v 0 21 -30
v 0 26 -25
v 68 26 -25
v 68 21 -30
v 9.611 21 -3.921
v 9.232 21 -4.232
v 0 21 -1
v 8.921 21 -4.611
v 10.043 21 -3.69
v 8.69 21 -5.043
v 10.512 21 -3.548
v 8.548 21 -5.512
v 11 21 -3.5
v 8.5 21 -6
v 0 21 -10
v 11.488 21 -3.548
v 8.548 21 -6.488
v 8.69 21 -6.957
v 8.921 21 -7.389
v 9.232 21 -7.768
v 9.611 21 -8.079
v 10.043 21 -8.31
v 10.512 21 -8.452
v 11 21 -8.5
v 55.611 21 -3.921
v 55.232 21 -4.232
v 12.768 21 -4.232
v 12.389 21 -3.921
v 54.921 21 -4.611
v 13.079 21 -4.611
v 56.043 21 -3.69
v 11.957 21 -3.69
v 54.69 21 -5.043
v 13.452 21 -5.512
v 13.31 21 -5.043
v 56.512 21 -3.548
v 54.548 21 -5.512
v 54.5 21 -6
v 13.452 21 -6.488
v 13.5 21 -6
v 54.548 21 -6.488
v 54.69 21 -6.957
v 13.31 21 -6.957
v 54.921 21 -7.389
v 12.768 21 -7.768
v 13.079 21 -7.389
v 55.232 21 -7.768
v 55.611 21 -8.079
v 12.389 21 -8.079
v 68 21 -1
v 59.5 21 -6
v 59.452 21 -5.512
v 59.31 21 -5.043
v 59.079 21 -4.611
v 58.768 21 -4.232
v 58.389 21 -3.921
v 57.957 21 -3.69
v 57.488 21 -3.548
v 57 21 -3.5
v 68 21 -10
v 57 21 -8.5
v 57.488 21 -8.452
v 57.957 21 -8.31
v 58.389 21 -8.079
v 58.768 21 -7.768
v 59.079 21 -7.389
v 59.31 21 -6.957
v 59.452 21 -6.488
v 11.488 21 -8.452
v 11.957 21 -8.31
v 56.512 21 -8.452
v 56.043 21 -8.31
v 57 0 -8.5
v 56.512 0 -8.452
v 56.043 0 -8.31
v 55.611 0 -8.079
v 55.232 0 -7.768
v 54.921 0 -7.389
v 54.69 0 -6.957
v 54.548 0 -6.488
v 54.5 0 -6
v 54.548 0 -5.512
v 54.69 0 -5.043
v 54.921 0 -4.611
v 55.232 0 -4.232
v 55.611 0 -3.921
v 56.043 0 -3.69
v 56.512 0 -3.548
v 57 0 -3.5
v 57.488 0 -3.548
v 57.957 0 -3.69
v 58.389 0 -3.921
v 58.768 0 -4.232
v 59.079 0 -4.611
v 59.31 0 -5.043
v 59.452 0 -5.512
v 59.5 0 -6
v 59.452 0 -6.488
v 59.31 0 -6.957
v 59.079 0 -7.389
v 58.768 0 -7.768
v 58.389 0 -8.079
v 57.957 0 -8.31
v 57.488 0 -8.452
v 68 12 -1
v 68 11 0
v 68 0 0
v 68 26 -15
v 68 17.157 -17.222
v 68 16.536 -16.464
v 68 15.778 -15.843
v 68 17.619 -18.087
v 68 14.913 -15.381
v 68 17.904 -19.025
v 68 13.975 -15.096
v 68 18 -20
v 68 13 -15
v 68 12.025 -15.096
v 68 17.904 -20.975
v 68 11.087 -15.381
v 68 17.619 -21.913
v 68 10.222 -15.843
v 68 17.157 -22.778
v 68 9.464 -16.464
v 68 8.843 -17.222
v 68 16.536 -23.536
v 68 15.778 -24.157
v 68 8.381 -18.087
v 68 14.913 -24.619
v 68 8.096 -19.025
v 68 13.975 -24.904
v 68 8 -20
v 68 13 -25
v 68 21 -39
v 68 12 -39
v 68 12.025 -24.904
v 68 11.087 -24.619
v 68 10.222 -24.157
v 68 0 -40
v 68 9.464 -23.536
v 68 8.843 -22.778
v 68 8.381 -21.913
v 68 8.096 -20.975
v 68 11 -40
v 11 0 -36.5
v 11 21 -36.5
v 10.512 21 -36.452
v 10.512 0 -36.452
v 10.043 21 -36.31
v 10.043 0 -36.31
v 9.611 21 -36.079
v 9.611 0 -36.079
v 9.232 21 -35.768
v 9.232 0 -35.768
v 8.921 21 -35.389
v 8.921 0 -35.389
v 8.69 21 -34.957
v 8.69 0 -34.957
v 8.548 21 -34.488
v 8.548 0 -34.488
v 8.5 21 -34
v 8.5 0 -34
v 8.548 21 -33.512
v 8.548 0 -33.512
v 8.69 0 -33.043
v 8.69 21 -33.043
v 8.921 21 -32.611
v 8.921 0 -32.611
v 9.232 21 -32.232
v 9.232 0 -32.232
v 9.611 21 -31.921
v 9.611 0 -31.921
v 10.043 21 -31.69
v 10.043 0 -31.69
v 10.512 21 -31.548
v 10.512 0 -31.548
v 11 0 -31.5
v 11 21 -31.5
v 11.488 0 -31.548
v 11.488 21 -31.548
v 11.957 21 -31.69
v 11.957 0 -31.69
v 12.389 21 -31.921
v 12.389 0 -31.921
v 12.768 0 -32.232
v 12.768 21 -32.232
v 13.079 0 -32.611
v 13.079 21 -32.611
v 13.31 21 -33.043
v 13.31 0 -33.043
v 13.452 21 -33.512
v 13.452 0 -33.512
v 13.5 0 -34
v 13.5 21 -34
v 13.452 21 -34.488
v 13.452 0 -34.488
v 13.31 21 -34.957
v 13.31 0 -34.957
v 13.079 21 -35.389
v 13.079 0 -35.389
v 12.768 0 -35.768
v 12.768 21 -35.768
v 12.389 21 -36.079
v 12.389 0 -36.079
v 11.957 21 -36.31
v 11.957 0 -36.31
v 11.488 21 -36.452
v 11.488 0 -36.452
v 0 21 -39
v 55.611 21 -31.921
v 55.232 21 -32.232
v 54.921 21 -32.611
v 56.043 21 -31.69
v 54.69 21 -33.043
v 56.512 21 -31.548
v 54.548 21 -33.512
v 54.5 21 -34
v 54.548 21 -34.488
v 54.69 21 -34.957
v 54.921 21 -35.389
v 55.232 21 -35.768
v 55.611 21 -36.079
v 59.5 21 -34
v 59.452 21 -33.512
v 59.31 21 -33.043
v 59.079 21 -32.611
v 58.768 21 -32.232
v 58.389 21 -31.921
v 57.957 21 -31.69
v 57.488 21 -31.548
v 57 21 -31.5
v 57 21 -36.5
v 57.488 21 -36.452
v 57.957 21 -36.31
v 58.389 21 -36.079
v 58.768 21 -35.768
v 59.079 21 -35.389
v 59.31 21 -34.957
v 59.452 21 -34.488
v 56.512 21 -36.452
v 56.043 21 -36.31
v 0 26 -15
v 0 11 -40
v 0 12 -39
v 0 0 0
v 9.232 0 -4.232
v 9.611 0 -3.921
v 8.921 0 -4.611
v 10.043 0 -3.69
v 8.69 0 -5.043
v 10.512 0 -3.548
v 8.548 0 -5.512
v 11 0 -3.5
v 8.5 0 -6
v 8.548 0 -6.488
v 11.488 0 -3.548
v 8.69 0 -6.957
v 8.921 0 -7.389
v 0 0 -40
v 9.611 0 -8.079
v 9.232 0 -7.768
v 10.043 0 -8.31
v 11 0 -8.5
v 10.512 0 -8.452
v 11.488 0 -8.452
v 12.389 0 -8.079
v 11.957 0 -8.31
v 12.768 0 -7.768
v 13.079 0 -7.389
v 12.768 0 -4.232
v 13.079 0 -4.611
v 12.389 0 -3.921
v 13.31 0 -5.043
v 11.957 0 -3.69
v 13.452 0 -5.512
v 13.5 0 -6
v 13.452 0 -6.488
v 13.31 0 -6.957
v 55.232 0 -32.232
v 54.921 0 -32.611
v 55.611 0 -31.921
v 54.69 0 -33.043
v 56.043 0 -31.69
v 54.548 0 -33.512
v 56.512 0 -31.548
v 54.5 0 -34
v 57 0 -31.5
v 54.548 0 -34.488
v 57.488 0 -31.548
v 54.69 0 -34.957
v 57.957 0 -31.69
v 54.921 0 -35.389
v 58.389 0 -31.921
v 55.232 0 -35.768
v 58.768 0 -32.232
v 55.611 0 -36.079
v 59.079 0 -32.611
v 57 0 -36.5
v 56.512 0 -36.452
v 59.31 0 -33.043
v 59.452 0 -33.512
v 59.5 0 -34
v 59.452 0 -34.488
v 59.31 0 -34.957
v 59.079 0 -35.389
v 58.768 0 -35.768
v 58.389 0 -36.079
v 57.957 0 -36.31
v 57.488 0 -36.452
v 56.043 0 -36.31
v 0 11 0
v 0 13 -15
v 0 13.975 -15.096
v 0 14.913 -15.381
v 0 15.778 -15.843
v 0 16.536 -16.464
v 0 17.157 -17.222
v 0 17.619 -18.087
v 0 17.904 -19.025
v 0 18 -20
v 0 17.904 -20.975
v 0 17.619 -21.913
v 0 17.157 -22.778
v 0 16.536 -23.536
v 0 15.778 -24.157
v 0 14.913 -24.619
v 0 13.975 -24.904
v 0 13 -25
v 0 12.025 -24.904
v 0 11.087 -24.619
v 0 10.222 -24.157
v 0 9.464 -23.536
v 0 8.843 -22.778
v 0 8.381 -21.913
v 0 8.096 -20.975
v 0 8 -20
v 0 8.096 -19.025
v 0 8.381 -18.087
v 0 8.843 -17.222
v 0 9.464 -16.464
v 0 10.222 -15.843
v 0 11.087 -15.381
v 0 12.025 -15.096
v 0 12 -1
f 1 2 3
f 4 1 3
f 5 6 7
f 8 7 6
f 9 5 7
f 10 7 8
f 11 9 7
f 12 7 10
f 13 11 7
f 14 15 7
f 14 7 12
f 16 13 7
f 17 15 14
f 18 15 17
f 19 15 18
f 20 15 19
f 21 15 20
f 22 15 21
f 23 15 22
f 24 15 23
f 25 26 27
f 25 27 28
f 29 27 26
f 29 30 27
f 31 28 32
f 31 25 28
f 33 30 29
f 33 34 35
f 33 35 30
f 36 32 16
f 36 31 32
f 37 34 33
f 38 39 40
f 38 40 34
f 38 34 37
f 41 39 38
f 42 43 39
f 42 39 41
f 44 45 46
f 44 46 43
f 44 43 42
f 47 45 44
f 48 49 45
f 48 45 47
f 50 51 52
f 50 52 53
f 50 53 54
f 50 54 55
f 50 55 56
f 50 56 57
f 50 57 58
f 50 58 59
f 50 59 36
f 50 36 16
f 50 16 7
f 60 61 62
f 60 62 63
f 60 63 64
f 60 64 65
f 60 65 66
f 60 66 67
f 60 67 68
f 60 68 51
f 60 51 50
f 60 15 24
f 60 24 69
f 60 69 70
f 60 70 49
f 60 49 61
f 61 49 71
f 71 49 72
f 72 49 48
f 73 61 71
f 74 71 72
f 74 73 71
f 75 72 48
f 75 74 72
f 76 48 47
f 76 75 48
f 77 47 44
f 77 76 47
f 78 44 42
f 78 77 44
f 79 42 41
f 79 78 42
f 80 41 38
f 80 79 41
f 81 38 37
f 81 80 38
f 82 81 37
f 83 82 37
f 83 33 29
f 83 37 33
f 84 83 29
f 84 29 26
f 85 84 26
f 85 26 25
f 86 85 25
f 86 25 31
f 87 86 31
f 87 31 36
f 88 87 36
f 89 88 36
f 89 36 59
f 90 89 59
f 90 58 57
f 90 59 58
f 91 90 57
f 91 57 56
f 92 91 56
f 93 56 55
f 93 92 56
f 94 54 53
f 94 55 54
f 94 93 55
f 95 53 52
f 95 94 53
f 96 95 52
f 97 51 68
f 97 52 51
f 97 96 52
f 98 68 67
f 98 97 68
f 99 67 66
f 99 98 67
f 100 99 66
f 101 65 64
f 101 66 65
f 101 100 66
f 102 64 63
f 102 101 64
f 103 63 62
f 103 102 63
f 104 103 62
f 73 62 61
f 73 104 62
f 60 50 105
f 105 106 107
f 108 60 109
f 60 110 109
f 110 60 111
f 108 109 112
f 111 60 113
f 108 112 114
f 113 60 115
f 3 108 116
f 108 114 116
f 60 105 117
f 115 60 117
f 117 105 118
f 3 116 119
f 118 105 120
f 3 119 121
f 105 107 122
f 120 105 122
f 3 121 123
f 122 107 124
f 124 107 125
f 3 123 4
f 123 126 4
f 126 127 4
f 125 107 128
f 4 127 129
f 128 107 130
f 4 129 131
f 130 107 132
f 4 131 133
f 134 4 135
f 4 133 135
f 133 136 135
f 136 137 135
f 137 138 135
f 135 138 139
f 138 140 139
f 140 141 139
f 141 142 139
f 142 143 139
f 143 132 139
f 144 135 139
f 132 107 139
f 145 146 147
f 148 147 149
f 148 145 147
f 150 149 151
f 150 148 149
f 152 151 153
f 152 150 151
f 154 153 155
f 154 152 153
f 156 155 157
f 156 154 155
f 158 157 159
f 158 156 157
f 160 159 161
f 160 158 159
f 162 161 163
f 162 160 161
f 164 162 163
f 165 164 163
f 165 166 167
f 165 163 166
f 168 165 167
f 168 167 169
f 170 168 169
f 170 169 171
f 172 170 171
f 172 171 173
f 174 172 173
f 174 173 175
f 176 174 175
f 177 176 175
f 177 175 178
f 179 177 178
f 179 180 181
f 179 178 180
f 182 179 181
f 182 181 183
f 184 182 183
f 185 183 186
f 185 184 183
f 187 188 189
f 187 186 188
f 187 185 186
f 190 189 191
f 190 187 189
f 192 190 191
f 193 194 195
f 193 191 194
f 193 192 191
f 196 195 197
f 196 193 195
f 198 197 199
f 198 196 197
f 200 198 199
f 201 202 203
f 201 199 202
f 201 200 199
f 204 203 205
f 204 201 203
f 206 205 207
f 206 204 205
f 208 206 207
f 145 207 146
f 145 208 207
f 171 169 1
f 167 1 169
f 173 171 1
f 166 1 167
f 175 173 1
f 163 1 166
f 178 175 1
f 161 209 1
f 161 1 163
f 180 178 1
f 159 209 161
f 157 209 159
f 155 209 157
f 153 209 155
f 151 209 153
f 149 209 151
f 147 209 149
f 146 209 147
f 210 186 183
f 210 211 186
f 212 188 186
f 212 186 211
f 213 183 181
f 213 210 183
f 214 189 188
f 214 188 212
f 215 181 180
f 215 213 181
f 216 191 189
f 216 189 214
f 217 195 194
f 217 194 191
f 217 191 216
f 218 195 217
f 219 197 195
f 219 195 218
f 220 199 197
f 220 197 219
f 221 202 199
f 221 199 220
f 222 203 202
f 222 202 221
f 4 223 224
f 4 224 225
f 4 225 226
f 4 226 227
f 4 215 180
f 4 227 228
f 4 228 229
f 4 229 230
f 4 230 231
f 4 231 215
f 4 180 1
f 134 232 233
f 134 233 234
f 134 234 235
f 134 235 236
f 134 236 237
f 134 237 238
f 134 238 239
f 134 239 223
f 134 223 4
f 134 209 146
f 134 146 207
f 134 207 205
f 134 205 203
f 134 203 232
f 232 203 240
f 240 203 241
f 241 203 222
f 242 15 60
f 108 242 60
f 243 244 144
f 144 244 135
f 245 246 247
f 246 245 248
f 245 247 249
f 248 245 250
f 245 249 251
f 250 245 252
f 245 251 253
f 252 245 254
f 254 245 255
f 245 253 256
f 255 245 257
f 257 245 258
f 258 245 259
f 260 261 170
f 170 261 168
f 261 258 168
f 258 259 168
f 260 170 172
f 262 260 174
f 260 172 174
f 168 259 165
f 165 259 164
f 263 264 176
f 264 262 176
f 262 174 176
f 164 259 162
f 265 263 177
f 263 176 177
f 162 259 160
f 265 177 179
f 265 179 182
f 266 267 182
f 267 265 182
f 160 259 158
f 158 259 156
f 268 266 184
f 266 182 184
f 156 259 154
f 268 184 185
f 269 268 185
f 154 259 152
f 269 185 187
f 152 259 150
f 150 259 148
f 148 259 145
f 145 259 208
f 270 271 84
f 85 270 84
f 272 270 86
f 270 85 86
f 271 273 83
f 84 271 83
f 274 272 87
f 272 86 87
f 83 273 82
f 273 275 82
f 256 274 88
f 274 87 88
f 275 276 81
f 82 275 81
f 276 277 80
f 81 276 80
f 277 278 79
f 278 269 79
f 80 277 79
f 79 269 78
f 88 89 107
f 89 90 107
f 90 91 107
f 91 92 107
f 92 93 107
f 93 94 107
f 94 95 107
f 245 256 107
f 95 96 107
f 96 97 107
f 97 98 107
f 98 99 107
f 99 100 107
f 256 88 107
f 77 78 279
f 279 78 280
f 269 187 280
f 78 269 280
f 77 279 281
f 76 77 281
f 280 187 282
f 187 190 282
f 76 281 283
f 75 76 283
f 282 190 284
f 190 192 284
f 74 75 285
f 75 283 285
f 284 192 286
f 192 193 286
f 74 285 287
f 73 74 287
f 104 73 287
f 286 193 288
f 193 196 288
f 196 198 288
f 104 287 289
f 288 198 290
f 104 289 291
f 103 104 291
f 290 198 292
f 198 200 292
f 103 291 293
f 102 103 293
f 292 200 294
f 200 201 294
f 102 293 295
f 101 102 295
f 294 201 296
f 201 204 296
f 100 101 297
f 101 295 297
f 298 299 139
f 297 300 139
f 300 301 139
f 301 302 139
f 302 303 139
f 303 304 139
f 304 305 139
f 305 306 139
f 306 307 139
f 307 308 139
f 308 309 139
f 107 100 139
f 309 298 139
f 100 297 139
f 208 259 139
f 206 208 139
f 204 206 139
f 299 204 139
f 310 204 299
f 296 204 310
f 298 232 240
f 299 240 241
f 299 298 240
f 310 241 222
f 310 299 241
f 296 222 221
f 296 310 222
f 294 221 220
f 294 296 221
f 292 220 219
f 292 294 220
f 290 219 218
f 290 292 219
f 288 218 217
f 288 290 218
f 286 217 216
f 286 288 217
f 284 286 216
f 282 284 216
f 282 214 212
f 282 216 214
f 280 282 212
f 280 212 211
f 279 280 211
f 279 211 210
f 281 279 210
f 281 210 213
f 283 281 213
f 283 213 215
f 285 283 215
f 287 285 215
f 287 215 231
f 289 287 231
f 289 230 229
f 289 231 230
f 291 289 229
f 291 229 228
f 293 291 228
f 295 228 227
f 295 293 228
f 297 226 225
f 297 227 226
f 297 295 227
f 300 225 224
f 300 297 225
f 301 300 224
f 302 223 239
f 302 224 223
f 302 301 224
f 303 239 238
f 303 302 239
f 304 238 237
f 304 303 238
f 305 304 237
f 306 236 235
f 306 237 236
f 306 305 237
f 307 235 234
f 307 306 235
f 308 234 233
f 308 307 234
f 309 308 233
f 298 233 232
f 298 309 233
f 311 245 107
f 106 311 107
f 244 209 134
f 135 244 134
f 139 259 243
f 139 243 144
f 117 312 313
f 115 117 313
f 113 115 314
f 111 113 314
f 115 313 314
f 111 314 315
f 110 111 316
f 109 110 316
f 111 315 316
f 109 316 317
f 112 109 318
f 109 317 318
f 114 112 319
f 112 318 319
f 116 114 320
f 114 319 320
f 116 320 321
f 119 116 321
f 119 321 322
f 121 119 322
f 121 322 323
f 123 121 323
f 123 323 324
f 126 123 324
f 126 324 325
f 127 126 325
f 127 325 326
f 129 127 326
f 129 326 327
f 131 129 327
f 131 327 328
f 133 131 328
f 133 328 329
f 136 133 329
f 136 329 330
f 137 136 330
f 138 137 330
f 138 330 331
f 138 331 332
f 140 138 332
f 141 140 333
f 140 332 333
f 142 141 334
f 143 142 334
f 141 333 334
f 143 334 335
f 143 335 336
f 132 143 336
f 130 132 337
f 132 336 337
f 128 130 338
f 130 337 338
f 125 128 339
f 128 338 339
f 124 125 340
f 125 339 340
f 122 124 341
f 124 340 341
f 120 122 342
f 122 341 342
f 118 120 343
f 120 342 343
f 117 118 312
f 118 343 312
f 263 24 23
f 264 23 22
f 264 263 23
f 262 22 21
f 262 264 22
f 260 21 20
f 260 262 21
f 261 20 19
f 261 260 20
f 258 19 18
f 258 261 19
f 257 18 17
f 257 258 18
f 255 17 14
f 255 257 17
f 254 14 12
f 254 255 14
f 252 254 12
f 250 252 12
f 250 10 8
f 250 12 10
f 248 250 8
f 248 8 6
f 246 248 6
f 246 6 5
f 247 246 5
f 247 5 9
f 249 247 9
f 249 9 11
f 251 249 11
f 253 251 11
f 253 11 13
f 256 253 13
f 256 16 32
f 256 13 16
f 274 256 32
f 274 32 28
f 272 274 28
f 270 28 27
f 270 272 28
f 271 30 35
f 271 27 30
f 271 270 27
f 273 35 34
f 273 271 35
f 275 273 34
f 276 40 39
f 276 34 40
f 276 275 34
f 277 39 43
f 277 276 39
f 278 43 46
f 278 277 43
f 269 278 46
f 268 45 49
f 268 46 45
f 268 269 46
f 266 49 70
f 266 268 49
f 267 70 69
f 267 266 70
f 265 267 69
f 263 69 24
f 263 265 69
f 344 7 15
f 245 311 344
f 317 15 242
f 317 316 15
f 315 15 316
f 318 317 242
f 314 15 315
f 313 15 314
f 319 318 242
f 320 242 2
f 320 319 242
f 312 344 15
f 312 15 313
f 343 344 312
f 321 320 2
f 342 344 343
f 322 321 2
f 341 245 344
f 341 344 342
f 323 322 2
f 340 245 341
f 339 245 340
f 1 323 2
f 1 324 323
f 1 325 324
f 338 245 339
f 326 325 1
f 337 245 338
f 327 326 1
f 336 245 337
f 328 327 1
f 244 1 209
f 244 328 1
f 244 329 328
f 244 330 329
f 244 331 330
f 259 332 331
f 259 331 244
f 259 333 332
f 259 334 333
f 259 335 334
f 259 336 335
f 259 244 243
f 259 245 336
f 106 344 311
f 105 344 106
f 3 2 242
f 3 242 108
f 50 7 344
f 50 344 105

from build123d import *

# Parameters (mm, degrees)
SKETCH_1_W          = 68
SKETCH_1_H          = 40
SKETCH_1_R          = 2.5
EXTRUDE_1_DEPTH     = 26
SKETCH_2_R          = 5
CUT_EXTRUDE_1_DEPTH = 76
SKETCH_3_W          = 68
SKETCH_3_H          = 10
CUT_EXTRUDE_2_DEPTH = 5
CHAMFER_1_SIZE      = 5
CHAMFER_2_SIZE      = 5
SKETCH_4_W          = 68
SKETCH_4_H          = 1
CUT_EXTRUDE_3_DEPTH = 9
CHAMFER_3_SIZE      = 1
CHAMFER_4_SIZE      = 1


with BuildPart() as part:
    # Эскиз1 → Бобышка-Вытянуть1 (new body)
    with BuildSketch(Plane(origin=(0, 0, 0), x_dir=(1, 0, 0), z_dir=(0, 1, 0))):
        with Locations((34, 20)):
            Rectangle(SKETCH_1_W, SKETCH_1_H)
        with Locations(Location((11, 34, 0), (0, 0, 90))):
            Circle(SKETCH_1_R, mode=Mode.SUBTRACT)
        with Locations(Location((11, 6, 0), (0, 0, 90))):
            Circle(SKETCH_1_R, mode=Mode.SUBTRACT)
        with Locations(Location((57, 34, 0), (0, 0, 90))):
            Circle(SKETCH_1_R, mode=Mode.SUBTRACT)
        with Locations(Location((57, 6, 0), (0, 0, 90))):
            Circle(SKETCH_1_R, mode=Mode.SUBTRACT)
    extrude(amount=EXTRUDE_1_DEPTH)

    # Эскиз2 → Вырез-Вытянуть1 (cut)
    with BuildSketch(Plane.ZY):
        with Locations((-20, 13)):
            Circle(SKETCH_2_R)
    extrude(amount=-CUT_EXTRUDE_1_DEPTH, mode=Mode.SUBTRACT)

    # Эскиз3 → Вырез-Вытянуть2 (cut)
    with BuildSketch(Plane(origin=(0, 26, 0), x_dir=(1, 0, 0), z_dir=(0, 1, 0))):
        with Locations((34, 35)):
            Rectangle(SKETCH_3_W, SKETCH_3_H)
        with Locations((34, 5)):
            Rectangle(SKETCH_3_W, SKETCH_3_H)
    extrude(amount=-CUT_EXTRUDE_2_DEPTH, mode=Mode.SUBTRACT)

    # Фаска1
    chamfer_1_edges = [part.edges().sort_by_distance(p)[0] for p in [
        (34, 26, -30),
    ]]
    chamfer(chamfer_1_edges, length=CHAMFER_1_SIZE - 0.0001)  # a hair under: the kernel refuses the full size

    # Фаска2
    chamfer_2_edges = [part.edges().sort_by_distance(p)[0] for p in [
        (34, 26, -10),
    ]]
    chamfer(chamfer_2_edges, length=CHAMFER_2_SIZE - 0.0001)  # a hair under: the kernel refuses the full size

    # Эскиз4 → Вырез-Вытянуть3 (cut)
    with BuildSketch(Plane(origin=(0, 21, 0), x_dir=(1, 0, 0), z_dir=(0, 1, 0))):
        with Locations((34, 39.5)):
            Rectangle(SKETCH_4_W, SKETCH_4_H)
        with Locations((34, 0.5)):
            Rectangle(SKETCH_4_W, SKETCH_4_H)
    extrude(amount=-CUT_EXTRUDE_3_DEPTH, mode=Mode.SUBTRACT)

    # Фаска3
    chamfer_3_edges = [part.edges().sort_by_distance(p)[0] for p in [
        (34, 12, -40),
    ]]
    chamfer(chamfer_3_edges, length=CHAMFER_3_SIZE - 0.0001)  # a hair under: the kernel refuses the full size

    # Фаска4
    chamfer_4_edges = [part.edges().sort_by_distance(p)[0] for p in [
        (34, 12, 0),
    ]]
    chamfer(chamfer_4_edges, length=CHAMFER_4_SIZE - 0.0001)  # a hair under: the kernel refuses the full size


solid = part.part
